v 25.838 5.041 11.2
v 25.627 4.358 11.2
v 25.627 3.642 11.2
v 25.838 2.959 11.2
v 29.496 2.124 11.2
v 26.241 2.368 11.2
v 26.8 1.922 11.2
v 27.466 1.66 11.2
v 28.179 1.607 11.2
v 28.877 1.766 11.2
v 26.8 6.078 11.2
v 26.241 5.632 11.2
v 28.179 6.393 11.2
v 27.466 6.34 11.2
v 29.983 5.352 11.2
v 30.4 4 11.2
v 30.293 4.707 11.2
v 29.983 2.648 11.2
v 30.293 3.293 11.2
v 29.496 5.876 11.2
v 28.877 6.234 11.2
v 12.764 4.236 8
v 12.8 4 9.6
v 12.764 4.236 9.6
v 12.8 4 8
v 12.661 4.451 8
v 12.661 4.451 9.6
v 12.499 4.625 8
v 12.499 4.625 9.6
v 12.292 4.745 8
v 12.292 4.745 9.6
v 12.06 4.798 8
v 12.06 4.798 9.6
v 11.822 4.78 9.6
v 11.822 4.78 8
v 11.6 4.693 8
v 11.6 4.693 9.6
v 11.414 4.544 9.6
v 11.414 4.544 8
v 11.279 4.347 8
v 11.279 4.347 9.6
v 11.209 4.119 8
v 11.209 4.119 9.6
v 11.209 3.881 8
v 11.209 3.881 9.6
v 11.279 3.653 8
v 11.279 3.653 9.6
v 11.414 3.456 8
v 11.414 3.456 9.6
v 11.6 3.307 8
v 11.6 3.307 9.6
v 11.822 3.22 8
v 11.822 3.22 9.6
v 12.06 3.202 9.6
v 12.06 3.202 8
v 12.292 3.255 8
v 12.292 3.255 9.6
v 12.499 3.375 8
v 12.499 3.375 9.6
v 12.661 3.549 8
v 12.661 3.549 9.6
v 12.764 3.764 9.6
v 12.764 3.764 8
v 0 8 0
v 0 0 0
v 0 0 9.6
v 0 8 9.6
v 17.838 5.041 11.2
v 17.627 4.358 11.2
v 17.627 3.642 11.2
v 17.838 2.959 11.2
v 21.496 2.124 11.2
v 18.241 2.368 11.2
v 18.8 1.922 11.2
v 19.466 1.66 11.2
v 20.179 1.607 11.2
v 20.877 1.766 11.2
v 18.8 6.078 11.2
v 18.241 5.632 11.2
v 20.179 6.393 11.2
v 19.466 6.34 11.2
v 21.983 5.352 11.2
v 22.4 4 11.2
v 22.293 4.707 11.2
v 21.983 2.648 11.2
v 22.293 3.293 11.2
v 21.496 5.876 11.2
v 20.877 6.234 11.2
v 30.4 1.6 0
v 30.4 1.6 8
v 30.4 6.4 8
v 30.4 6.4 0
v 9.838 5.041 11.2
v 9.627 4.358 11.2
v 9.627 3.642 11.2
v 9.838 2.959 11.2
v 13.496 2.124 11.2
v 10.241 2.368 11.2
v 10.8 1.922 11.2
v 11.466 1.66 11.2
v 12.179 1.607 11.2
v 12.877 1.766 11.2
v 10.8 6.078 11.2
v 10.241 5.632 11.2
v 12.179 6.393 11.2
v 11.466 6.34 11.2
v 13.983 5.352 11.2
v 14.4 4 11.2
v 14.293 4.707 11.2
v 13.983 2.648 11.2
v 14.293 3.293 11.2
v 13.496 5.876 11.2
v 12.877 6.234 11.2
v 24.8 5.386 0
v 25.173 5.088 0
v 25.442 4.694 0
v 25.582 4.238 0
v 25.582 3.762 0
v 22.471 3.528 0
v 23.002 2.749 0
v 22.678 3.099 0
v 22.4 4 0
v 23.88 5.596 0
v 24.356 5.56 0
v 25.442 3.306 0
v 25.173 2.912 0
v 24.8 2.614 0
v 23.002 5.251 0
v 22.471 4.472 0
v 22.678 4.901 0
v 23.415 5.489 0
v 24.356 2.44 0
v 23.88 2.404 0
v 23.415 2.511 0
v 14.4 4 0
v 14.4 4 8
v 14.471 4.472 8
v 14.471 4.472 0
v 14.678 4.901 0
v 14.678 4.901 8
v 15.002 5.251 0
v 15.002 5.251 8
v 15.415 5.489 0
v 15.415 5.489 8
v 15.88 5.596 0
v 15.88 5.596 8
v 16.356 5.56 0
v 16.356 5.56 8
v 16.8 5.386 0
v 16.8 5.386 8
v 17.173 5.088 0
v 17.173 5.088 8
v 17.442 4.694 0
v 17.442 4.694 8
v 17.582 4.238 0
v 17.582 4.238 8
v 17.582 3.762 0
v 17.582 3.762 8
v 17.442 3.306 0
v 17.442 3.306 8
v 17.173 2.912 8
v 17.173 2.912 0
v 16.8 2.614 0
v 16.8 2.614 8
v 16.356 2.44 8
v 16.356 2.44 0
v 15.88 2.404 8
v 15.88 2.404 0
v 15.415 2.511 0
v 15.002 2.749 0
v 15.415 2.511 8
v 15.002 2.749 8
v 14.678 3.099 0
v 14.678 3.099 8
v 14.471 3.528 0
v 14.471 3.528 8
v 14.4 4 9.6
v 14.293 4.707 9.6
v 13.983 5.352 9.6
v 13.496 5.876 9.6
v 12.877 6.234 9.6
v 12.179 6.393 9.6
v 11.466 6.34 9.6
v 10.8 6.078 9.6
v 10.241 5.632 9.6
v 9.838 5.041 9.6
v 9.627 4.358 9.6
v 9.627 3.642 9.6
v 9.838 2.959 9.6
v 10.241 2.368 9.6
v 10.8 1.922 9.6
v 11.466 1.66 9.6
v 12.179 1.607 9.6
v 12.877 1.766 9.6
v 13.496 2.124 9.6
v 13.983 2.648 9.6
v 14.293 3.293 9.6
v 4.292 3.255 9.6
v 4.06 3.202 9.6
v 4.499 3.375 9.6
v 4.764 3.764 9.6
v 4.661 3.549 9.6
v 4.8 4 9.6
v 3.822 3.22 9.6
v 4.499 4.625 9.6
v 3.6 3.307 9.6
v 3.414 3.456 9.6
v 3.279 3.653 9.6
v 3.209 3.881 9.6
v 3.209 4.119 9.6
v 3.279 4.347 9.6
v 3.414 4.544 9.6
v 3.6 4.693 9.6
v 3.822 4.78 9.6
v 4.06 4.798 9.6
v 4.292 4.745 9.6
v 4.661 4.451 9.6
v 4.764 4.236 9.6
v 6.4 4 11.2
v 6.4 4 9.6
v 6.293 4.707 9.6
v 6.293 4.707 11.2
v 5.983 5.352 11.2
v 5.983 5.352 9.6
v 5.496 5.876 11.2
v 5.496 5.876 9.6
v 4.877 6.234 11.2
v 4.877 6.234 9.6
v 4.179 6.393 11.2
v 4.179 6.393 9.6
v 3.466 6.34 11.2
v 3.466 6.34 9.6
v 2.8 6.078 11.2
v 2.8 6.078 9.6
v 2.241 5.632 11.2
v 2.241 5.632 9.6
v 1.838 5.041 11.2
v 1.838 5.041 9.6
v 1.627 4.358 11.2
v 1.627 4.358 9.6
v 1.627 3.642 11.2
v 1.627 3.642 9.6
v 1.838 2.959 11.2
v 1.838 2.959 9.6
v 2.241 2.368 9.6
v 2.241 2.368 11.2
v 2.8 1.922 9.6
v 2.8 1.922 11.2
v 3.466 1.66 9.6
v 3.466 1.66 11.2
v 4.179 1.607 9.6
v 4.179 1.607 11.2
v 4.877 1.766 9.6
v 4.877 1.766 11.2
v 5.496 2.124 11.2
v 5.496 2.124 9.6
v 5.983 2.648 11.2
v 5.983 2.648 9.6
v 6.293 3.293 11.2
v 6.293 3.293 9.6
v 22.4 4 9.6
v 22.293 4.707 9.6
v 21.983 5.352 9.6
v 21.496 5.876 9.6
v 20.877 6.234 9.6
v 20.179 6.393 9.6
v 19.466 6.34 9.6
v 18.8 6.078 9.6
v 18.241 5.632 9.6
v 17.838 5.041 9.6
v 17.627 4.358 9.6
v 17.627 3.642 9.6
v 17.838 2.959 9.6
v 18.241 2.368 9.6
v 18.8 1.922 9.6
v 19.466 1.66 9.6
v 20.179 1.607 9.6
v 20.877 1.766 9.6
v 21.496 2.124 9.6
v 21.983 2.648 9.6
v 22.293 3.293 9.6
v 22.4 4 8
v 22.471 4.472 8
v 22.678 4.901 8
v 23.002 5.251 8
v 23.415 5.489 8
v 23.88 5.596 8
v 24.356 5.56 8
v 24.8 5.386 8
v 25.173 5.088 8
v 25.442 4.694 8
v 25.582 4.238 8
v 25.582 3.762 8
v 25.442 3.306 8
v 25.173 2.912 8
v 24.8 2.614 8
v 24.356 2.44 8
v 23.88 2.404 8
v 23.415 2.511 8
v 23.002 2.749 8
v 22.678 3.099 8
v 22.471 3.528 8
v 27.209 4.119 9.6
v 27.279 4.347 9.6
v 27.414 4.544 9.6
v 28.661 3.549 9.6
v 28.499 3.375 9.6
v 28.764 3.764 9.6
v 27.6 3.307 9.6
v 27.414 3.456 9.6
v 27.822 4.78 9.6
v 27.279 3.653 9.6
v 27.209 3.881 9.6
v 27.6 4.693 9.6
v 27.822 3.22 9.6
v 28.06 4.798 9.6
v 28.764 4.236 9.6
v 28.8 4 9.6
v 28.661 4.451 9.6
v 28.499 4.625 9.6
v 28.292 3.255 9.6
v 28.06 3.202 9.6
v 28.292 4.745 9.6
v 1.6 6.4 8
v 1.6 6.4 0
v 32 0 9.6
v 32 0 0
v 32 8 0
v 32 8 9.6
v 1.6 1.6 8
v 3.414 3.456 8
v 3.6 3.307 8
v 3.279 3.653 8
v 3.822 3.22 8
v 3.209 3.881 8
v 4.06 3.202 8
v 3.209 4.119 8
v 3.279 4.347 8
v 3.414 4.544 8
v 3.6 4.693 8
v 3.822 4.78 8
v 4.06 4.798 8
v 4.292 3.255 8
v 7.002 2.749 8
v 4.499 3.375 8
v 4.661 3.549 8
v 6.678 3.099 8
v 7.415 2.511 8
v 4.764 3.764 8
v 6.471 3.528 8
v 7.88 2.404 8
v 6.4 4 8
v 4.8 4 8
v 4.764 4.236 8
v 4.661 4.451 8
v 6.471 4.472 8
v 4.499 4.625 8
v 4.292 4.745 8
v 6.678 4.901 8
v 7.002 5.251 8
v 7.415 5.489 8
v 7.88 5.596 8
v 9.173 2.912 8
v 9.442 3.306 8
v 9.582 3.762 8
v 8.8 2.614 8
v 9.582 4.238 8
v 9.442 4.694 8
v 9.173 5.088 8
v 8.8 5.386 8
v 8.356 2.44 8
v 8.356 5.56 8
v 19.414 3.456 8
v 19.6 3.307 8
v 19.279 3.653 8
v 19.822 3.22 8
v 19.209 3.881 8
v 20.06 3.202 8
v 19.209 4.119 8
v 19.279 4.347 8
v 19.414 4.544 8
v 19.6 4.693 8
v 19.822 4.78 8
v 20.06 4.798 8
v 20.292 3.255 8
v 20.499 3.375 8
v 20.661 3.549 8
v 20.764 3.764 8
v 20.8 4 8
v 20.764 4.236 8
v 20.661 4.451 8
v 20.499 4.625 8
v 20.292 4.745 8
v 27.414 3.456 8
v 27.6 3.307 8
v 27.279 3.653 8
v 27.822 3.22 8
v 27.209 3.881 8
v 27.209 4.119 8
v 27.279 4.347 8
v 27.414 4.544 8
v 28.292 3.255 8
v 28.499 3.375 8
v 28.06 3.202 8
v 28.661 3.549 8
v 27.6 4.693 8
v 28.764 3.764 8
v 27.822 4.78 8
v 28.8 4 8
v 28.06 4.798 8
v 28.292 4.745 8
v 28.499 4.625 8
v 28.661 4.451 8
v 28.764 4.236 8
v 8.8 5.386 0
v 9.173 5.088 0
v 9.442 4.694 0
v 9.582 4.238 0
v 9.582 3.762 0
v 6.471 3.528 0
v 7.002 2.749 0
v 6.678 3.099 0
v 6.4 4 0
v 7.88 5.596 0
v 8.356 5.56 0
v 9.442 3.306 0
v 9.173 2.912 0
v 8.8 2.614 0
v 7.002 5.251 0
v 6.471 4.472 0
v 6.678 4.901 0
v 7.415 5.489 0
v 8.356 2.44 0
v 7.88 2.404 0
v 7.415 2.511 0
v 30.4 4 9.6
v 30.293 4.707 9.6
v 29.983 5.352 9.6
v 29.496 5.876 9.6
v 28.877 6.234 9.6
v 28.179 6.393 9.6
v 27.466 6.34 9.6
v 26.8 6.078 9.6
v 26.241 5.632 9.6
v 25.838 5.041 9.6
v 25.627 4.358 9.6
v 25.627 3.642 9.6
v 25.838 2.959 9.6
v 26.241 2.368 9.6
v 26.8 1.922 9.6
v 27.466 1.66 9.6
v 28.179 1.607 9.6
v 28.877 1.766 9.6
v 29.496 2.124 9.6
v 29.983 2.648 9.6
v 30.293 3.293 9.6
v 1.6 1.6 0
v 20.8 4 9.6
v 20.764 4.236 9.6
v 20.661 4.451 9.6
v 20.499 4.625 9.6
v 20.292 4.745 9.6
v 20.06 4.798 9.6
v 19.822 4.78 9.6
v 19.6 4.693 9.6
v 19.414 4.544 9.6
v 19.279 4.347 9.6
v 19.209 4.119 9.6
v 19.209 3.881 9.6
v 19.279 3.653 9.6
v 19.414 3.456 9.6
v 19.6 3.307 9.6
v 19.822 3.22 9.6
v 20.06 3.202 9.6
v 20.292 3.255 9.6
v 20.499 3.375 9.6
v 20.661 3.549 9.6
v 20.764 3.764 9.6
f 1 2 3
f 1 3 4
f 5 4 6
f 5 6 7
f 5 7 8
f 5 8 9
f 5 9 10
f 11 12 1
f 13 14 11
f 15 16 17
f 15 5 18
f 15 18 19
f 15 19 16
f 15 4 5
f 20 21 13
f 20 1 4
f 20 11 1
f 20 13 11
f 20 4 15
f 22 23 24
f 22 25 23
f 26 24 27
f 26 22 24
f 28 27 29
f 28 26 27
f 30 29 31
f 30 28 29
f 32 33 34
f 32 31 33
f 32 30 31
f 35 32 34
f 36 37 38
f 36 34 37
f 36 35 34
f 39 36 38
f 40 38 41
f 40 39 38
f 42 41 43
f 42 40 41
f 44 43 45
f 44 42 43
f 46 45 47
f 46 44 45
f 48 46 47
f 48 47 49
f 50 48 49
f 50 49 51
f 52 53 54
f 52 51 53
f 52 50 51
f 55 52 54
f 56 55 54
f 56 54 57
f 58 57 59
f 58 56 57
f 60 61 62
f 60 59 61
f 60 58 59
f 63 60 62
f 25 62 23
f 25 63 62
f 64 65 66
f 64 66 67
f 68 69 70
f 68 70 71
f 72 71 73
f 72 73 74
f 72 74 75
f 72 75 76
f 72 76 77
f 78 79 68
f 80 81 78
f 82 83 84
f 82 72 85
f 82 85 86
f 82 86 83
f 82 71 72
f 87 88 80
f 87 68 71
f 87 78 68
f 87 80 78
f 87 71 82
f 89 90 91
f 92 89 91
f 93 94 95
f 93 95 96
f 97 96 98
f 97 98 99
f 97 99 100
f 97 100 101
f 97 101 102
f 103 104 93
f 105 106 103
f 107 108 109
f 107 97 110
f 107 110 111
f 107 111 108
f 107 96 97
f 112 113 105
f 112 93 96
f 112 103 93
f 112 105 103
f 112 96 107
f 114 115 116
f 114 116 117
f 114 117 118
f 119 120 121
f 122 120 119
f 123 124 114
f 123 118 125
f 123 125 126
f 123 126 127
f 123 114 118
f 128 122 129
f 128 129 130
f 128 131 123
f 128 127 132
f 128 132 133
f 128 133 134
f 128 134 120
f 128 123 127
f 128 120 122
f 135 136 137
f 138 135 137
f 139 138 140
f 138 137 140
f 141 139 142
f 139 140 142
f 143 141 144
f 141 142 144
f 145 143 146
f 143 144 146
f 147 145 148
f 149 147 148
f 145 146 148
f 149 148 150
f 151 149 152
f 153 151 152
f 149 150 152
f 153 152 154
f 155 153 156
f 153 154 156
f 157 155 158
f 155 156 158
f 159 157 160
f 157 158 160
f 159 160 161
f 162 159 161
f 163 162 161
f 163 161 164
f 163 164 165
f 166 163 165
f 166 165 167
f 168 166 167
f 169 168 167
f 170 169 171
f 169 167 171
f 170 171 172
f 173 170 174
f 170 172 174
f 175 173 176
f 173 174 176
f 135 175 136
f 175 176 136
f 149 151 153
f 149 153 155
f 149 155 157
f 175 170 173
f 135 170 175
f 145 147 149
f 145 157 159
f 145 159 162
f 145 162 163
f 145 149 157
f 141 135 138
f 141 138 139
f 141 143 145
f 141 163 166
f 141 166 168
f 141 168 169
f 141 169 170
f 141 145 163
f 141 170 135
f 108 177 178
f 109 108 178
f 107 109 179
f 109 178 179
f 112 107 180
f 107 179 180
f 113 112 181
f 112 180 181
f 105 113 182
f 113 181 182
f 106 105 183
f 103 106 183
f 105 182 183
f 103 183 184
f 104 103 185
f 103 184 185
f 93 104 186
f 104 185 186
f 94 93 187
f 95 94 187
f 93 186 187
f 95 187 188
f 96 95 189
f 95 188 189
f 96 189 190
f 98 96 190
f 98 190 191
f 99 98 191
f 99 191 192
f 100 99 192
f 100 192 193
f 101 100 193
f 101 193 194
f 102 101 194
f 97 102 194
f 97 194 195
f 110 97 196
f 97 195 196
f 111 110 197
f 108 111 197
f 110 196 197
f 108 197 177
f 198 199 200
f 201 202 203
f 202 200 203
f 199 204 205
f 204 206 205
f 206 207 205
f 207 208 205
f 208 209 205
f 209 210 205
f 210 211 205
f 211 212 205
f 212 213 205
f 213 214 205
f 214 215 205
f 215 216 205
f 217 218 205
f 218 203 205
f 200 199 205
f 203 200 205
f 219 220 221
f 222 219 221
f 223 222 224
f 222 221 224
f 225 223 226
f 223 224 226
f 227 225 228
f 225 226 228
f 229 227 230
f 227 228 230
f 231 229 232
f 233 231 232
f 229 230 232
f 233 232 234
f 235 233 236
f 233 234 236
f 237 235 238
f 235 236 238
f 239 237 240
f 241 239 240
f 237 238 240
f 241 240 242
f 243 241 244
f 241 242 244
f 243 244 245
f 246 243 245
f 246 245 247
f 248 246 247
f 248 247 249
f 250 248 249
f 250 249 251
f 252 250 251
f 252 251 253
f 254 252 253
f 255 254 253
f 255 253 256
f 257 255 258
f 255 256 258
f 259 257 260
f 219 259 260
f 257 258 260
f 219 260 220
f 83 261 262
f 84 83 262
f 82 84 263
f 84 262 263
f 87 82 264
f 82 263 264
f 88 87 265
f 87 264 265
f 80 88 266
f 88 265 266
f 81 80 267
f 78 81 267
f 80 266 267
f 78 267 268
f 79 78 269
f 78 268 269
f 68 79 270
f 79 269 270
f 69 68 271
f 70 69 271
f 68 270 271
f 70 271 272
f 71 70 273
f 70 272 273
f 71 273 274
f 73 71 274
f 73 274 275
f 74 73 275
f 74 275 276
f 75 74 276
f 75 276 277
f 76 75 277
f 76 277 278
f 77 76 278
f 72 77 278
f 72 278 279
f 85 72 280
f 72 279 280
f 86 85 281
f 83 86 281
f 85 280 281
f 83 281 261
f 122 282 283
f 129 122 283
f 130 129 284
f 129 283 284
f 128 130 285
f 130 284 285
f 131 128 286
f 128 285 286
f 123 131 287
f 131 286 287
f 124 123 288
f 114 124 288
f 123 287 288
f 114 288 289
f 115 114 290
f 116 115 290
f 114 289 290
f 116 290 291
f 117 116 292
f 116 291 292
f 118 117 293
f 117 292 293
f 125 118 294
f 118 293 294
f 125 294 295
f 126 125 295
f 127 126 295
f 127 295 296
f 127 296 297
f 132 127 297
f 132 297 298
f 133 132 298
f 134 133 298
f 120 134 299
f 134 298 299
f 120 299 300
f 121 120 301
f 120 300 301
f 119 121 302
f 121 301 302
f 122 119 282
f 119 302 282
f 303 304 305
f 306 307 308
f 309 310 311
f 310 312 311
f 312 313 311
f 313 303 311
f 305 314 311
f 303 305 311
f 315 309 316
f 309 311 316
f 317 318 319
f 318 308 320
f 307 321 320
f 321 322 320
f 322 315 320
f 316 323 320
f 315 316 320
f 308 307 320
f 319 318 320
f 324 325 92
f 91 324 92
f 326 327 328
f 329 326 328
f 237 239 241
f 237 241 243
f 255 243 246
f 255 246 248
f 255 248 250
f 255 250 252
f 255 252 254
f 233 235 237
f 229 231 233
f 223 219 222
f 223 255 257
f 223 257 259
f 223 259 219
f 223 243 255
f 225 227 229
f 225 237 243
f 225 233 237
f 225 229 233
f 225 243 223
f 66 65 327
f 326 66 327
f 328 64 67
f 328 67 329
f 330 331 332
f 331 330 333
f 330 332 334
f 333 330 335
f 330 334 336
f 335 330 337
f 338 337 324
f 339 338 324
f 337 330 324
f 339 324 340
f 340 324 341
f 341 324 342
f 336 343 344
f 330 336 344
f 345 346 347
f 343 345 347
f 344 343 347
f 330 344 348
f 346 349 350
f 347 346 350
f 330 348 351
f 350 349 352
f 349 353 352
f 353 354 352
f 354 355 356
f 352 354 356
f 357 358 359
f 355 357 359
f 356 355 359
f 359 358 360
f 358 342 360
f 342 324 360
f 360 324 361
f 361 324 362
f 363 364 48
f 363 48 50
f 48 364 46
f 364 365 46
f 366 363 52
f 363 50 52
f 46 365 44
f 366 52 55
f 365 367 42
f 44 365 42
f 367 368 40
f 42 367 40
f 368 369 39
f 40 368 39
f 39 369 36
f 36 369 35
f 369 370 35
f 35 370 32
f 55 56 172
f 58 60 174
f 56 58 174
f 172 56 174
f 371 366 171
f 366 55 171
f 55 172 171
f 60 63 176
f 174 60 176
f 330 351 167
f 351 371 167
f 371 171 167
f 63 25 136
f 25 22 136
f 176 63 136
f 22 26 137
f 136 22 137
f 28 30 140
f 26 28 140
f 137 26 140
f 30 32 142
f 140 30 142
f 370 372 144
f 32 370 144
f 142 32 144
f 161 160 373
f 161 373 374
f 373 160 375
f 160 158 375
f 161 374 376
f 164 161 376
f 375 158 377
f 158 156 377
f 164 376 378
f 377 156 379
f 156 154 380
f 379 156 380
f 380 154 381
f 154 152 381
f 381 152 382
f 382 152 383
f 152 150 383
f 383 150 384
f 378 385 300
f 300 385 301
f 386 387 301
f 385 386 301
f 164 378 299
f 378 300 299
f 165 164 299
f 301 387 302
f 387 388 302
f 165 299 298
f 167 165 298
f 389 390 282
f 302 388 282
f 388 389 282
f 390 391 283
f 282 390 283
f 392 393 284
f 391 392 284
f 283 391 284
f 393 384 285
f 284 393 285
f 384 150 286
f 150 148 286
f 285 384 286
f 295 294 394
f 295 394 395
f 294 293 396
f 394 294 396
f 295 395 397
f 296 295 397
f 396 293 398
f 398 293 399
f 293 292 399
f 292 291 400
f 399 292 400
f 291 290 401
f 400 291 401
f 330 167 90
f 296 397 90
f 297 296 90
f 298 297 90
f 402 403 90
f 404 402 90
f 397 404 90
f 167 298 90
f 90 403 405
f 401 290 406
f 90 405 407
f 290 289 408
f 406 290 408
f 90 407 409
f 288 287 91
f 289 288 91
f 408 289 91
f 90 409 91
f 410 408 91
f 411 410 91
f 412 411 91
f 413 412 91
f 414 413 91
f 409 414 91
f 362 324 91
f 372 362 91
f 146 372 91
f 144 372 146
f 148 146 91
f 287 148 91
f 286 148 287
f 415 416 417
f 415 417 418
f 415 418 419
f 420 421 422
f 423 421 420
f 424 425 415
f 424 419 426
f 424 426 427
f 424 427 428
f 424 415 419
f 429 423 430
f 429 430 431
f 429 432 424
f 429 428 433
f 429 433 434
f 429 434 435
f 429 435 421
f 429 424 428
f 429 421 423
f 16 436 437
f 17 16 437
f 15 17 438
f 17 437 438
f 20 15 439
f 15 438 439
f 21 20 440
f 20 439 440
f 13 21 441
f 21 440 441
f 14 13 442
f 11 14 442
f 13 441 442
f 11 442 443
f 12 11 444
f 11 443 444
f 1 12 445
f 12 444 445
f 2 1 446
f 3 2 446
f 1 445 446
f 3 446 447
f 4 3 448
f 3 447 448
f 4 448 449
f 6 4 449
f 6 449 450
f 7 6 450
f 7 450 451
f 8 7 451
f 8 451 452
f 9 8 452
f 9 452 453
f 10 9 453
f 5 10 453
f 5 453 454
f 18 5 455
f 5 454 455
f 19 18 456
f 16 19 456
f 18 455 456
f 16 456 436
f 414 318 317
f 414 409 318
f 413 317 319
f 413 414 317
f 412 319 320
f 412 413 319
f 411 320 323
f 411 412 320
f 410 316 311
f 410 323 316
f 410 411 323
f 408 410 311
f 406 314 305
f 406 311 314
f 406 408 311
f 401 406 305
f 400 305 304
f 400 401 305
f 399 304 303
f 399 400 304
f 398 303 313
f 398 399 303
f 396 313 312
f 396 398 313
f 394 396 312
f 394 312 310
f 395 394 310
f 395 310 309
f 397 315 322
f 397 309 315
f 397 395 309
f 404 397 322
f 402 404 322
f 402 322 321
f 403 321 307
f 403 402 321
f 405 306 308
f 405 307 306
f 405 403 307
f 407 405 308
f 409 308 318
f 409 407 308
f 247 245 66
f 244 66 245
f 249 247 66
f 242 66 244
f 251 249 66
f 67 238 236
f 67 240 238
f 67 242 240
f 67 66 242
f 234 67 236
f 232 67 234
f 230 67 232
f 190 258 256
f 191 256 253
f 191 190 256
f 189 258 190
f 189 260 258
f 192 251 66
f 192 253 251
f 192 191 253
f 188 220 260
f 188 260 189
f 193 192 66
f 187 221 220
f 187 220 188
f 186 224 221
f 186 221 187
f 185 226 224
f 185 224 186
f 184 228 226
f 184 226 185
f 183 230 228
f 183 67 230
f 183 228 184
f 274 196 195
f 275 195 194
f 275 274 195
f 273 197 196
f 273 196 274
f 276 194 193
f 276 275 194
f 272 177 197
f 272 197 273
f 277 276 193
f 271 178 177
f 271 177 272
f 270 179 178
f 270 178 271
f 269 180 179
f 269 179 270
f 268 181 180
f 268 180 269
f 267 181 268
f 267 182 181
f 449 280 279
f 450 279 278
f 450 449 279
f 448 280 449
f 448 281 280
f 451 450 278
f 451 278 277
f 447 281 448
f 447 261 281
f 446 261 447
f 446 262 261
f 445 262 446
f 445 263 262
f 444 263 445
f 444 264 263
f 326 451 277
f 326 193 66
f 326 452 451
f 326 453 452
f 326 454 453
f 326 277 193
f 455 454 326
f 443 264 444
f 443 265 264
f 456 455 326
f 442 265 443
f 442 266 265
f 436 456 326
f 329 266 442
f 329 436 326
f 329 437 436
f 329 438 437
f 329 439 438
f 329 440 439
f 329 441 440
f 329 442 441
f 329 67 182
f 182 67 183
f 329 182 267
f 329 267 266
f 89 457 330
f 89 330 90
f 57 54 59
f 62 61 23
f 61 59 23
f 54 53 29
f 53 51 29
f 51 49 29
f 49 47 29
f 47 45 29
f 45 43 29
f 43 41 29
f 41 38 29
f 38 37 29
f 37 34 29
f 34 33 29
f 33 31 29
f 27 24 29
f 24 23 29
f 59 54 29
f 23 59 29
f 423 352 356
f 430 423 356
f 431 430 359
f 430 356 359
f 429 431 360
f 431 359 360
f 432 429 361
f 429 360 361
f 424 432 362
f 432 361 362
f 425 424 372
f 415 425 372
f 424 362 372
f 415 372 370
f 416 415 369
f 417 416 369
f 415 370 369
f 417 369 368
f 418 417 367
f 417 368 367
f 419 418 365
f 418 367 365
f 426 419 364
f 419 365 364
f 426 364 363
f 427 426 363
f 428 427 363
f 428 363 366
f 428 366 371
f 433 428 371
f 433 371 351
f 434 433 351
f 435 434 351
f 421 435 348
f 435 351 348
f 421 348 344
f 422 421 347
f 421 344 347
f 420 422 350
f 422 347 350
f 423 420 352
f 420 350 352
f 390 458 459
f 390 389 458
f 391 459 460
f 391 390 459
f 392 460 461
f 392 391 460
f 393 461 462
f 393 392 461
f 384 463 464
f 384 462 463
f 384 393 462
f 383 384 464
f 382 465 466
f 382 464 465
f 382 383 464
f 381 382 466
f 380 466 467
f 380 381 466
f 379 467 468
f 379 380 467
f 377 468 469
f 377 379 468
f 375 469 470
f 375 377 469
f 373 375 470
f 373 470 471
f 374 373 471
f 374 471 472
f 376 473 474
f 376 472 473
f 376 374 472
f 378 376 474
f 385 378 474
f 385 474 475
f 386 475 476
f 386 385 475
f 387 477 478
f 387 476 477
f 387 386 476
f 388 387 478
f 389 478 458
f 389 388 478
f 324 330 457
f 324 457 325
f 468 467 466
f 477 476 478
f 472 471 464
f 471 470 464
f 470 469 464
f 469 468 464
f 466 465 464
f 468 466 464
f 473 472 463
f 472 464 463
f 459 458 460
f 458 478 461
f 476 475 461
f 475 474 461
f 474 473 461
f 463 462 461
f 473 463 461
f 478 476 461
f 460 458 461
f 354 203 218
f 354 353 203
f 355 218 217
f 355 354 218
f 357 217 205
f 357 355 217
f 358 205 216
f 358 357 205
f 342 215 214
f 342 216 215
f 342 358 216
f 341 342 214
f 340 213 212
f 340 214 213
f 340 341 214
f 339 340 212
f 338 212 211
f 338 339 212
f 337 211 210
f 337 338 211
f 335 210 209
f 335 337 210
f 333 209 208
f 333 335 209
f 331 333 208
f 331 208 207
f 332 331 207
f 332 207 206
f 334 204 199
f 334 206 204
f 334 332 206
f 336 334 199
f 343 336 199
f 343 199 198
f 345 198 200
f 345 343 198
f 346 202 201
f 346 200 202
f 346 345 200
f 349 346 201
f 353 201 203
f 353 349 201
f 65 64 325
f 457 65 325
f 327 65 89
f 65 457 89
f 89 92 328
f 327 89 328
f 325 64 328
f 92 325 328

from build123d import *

# Parameters (mm, degrees)
SKETCH1_W           = 32
SKETCH1_H           = 8
BOSS_EXTRUDE1_DEPTH = 9.6
SKETCH2_R           = 2.4
BOSS_EXTRUDE2_DEPTH = 1.6
LPATTERN1_COUNT     = 4
LPATTERN1_PITCH     = 8
SHELL1_T            = -1.6
SKETCH3_R           = 1.6
BOSS_EXTRUDE3_DEPTH = 8
LPATTERN2_COUNT     = 3
LPATTERN2_PITCH     = 8


with BuildPart() as part:
    # Sketch1 → Boss-Extrude1 (new body)
    with BuildSketch(Plane.XY):
        with Locations((16, 4)):
            Rectangle(SKETCH1_W, SKETCH1_H)
    extrude(amount=BOSS_EXTRUDE1_DEPTH)

    # Sketch2 → Boss-Extrude2 (add)
    with BuildSketch(Plane.XY.offset(9.6)):
        with Locations((4, 4)):
            Circle(SKETCH2_R)
    boss_extrude2 = extrude(amount=BOSS_EXTRUDE2_DEPTH)

    # LPattern1: Boss-Extrude2 ×4
    with Locations(*[(i * LPATTERN1_PITCH, 0, 0) for i in range(1, LPATTERN1_COUNT)]):
        add(boss_extrude2)

    # Shell1
    shell1_openings = [part.faces().sort_by_distance(p)[0] for p in [
        (16, 4, 0),
    ]]
    offset(amount=SHELL1_T, openings=shell1_openings, kind=Kind.INTERSECTION)

    # Sketch3 → Boss-Extrude3 (add)
    with BuildSketch(Plane(origin=(0, 0, 8), x_dir=(-1, 0, 0), z_dir=(0, 0, -1))):
        with Locations((-8, 4)):
            Circle(SKETCH3_R)
    boss_extrude3 = extrude(amount=BOSS_EXTRUDE3_DEPTH)

    # LPattern2: Boss-Extrude3 ×3
    with Locations(*[(i * LPATTERN2_PITCH, 0, 0) for i in range(1, LPATTERN2_COUNT)]):
        add(boss_extrude3)


solid = part.part
